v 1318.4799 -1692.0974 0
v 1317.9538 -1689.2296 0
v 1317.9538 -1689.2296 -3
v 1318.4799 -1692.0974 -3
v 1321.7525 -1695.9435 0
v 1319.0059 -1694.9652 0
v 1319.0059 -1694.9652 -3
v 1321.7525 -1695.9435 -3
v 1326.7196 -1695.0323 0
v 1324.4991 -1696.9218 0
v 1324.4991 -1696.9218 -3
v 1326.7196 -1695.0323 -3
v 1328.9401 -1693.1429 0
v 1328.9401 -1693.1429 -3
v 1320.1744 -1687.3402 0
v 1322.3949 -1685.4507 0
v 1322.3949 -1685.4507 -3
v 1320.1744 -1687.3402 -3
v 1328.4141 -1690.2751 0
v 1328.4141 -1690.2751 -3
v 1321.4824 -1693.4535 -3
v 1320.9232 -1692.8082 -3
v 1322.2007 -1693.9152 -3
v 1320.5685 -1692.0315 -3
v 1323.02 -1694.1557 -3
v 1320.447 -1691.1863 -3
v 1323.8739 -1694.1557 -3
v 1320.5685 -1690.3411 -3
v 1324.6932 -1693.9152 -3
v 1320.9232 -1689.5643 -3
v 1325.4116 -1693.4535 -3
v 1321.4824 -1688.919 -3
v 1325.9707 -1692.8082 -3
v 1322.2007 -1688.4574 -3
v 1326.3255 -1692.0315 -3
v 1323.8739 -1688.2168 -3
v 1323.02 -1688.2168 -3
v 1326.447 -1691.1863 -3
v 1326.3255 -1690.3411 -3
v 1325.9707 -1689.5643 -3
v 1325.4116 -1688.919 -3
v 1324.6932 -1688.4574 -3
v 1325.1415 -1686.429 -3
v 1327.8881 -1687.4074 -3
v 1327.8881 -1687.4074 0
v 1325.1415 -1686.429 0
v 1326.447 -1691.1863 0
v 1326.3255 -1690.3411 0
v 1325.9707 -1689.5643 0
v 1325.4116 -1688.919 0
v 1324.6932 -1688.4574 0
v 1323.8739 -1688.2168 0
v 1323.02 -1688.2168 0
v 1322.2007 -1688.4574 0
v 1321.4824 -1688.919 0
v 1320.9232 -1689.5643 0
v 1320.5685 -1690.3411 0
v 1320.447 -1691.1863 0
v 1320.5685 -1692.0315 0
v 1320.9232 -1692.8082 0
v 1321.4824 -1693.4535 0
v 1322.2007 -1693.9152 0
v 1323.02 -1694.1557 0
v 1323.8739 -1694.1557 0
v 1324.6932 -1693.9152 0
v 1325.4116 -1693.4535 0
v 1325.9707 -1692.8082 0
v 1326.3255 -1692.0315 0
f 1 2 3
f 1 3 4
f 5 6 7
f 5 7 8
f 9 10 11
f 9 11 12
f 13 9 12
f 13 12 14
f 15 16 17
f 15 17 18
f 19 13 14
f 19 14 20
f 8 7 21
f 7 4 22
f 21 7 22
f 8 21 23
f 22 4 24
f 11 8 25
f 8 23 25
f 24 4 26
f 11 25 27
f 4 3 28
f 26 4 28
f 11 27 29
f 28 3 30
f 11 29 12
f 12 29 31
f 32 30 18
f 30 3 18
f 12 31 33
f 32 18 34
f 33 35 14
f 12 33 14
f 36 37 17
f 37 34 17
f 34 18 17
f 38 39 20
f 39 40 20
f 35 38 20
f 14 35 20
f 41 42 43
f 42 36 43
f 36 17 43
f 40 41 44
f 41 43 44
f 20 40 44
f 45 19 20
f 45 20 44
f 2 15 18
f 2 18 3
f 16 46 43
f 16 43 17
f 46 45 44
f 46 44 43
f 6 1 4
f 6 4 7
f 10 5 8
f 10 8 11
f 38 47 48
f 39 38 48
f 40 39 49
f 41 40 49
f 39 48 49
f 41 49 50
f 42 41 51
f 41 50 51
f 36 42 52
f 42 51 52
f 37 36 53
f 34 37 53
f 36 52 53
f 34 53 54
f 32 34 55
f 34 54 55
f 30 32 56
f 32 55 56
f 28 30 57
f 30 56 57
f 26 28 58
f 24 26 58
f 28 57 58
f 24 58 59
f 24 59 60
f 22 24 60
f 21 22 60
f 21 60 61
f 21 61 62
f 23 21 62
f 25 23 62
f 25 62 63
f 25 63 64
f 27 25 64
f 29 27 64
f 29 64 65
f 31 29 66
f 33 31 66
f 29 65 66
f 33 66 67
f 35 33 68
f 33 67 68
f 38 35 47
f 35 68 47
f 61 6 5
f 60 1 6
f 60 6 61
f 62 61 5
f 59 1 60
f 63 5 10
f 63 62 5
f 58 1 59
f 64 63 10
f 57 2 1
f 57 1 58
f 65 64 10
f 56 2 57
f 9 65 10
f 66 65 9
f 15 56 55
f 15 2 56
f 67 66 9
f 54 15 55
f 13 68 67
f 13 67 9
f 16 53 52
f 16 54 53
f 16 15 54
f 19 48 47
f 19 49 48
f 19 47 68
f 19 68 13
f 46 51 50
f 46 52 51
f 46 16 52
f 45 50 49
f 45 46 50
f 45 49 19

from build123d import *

# Parameters (mm, degrees)
SKETCH1_R           = 3
BOSS_EXTRUDE1_DEPTH = 3


with BuildPart() as part:
    # Sketch1 → Boss-Extrude1 (new body)
    # profile 1 of 7: a face of its own
    with BuildSketch(Plane.XY):
        with BuildLine():
            ThreePointArc((1328.13150473, -1693.072432874), (1328.496972448, -1691.186259901), (1328.13150473, -1689.300086927))
            Line((1328.13150473, -1689.300086927), (1327.422718332, -1688.072432874))
            ThreePointArc((1327.422718332, -1688.072432874), (1325.97197848, -1686.812842059), (1324.15577091, -1686.186259901))
            Line((1324.15577091, -1686.186259901), (1322.738198114, -1686.186259901))
            ThreePointArc((1322.738198114, -1686.186259901), (1320.921990544, -1686.812842059), (1319.471250692, -1688.072432874))
            Line((1319.471250692, -1688.072432874), (1318.762464294, -1689.300086927))
            ThreePointArc((1318.762464294, -1689.300086927), (1318.396996575, -1691.186259901), (1318.762464294, -1693.072432874))
            Line((1318.762464294, -1693.072432874), (1319.471250692, -1694.300086927))
            ThreePointArc((1319.471250692, -1694.300086927), (1320.921990544, -1695.559677742), (1322.738198114, -1696.186259901))
            Line((1322.738198114, -1696.186259901), (1324.15577091, -1696.186259901))
            ThreePointArc((1324.15577091, -1696.186259901), (1325.97197848, -1695.559677742), (1327.422718332, -1694.300086927))
            Line((1327.422718332, -1694.300086927), (1328.13150473, -1693.072432874))
        make_face()
        with Locations((1323.446984512, -1691.186259901)):
            Circle(SKETCH1_R, mode=Mode.SUBTRACT)
    # profile 2 of 7: a face of its own
    with BuildSketch(Plane.XY):
        with BuildLine():
            Line((1321.752495925, -1695.943474063), (1324.499074459, -1696.921787568))
            Line((1324.499074459, -1696.921787568), (1326.719608123, -1695.032337494))
            ThreePointArc((1326.719608123, -1695.032337494), (1325.519613433, -1695.791320976), (1324.15577091, -1696.186259901))
            Line((1324.15577091, -1696.186259901), (1322.738198114, -1696.186259901))
            ThreePointArc((1322.738198114, -1696.186259901), (1322.239230852, -1696.089698414), (1321.752495925, -1695.943474063))
        make_face()
    # profile 3 of 7: a face of its own
    with BuildSketch(Plane.XY):
        with BuildLine():
            ThreePointArc((1327.422718332, -1694.300086927), (1327.089609813, -1694.683924703), (1326.719608123, -1695.032337494))
            Line((1326.719608123, -1695.032337494), (1328.940142149, -1693.142887113))
            Line((1328.940142149, -1693.142887113), (1328.414095669, -1690.275115064))
            ThreePointArc((1328.414095669, -1690.275115064), (1328.471399282, -1691.693836867), (1328.13150473, -1693.072432874))
            Line((1328.13150473, -1693.072432874), (1327.422718332, -1694.300086927))
        make_face()
    # profile 4 of 7: a face of its own
    with BuildSketch(Plane.XY):
        with BuildLine():
            ThreePointArc((1328.13150473, -1689.300086927), (1328.29736254, -1689.780482129), (1328.414095669, -1690.275115064))
            Line((1328.414095669, -1690.275115064), (1327.888052202, -1687.407359446))
            Line((1327.888052202, -1687.407359446), (1325.141464891, -1686.429042814))
            ThreePointArc((1325.141464891, -1686.429042814), (1326.398766175, -1687.08877736), (1327.422718332, -1688.072432874))
            Line((1327.422718332, -1688.072432874), (1328.13150473, -1689.300086927))
        make_face()
    # profile 5 of 7: a face of its own
    with BuildSketch(Plane.XY):
        with BuildLine():
            ThreePointArc((1324.15577091, -1686.186259901), (1324.654733942, -1686.282820345), (1325.141464891, -1686.429042814))
            Line((1325.141464891, -1686.429042814), (1322.394894565, -1685.450732233))
            Line((1322.394894565, -1685.450732233), (1320.17435296, -1687.340189064))
            ThreePointArc((1320.17435296, -1687.340189064), (1321.374350836, -1686.581200964), (1322.738198114, -1686.186259901))
            Line((1322.738198114, -1686.186259901), (1324.15577091, -1686.186259901))
        make_face()
    # profile 6 of 7: a face of its own
    with BuildSketch(Plane.XY):
        with BuildLine():
            Line((1317.953826874, -1689.229632688), (1318.479872929, -1692.097402415))
            ThreePointArc((1318.479872929, -1692.097402415), (1318.42256986, -1690.67868176), (1318.762464294, -1689.300086927))
            Line((1318.762464294, -1689.300086927), (1319.471250692, -1688.072432874))
            ThreePointArc((1319.471250692, -1688.072432874), (1319.8043556, -1687.688598858), (1320.17435296, -1687.340189064))
            Line((1320.17435296, -1687.340189064), (1317.953826874, -1689.229632688))
        make_face()
    # profile 7 of 7: a face of its own
    with BuildSketch(Plane.XY):
        with BuildLine():
            Line((1319.005916822, -1694.965160355), (1321.752495925, -1695.943474063))
            ThreePointArc((1321.752495925, -1695.943474063), (1320.495199314, -1695.283739895), (1319.471250692, -1694.300086927))
            Line((1319.471250692, -1694.300086927), (1318.762464294, -1693.072432874))
            ThreePointArc((1318.762464294, -1693.072432874), (1318.596606155, -1692.592036538), (1318.479872929, -1692.097402415))
            Line((1318.479872929, -1692.097402415), (1319.005916822, -1694.965160355))
        make_face()
    extrude(amount=-BOSS_EXTRUDE1_DEPTH)


solid = part.part
